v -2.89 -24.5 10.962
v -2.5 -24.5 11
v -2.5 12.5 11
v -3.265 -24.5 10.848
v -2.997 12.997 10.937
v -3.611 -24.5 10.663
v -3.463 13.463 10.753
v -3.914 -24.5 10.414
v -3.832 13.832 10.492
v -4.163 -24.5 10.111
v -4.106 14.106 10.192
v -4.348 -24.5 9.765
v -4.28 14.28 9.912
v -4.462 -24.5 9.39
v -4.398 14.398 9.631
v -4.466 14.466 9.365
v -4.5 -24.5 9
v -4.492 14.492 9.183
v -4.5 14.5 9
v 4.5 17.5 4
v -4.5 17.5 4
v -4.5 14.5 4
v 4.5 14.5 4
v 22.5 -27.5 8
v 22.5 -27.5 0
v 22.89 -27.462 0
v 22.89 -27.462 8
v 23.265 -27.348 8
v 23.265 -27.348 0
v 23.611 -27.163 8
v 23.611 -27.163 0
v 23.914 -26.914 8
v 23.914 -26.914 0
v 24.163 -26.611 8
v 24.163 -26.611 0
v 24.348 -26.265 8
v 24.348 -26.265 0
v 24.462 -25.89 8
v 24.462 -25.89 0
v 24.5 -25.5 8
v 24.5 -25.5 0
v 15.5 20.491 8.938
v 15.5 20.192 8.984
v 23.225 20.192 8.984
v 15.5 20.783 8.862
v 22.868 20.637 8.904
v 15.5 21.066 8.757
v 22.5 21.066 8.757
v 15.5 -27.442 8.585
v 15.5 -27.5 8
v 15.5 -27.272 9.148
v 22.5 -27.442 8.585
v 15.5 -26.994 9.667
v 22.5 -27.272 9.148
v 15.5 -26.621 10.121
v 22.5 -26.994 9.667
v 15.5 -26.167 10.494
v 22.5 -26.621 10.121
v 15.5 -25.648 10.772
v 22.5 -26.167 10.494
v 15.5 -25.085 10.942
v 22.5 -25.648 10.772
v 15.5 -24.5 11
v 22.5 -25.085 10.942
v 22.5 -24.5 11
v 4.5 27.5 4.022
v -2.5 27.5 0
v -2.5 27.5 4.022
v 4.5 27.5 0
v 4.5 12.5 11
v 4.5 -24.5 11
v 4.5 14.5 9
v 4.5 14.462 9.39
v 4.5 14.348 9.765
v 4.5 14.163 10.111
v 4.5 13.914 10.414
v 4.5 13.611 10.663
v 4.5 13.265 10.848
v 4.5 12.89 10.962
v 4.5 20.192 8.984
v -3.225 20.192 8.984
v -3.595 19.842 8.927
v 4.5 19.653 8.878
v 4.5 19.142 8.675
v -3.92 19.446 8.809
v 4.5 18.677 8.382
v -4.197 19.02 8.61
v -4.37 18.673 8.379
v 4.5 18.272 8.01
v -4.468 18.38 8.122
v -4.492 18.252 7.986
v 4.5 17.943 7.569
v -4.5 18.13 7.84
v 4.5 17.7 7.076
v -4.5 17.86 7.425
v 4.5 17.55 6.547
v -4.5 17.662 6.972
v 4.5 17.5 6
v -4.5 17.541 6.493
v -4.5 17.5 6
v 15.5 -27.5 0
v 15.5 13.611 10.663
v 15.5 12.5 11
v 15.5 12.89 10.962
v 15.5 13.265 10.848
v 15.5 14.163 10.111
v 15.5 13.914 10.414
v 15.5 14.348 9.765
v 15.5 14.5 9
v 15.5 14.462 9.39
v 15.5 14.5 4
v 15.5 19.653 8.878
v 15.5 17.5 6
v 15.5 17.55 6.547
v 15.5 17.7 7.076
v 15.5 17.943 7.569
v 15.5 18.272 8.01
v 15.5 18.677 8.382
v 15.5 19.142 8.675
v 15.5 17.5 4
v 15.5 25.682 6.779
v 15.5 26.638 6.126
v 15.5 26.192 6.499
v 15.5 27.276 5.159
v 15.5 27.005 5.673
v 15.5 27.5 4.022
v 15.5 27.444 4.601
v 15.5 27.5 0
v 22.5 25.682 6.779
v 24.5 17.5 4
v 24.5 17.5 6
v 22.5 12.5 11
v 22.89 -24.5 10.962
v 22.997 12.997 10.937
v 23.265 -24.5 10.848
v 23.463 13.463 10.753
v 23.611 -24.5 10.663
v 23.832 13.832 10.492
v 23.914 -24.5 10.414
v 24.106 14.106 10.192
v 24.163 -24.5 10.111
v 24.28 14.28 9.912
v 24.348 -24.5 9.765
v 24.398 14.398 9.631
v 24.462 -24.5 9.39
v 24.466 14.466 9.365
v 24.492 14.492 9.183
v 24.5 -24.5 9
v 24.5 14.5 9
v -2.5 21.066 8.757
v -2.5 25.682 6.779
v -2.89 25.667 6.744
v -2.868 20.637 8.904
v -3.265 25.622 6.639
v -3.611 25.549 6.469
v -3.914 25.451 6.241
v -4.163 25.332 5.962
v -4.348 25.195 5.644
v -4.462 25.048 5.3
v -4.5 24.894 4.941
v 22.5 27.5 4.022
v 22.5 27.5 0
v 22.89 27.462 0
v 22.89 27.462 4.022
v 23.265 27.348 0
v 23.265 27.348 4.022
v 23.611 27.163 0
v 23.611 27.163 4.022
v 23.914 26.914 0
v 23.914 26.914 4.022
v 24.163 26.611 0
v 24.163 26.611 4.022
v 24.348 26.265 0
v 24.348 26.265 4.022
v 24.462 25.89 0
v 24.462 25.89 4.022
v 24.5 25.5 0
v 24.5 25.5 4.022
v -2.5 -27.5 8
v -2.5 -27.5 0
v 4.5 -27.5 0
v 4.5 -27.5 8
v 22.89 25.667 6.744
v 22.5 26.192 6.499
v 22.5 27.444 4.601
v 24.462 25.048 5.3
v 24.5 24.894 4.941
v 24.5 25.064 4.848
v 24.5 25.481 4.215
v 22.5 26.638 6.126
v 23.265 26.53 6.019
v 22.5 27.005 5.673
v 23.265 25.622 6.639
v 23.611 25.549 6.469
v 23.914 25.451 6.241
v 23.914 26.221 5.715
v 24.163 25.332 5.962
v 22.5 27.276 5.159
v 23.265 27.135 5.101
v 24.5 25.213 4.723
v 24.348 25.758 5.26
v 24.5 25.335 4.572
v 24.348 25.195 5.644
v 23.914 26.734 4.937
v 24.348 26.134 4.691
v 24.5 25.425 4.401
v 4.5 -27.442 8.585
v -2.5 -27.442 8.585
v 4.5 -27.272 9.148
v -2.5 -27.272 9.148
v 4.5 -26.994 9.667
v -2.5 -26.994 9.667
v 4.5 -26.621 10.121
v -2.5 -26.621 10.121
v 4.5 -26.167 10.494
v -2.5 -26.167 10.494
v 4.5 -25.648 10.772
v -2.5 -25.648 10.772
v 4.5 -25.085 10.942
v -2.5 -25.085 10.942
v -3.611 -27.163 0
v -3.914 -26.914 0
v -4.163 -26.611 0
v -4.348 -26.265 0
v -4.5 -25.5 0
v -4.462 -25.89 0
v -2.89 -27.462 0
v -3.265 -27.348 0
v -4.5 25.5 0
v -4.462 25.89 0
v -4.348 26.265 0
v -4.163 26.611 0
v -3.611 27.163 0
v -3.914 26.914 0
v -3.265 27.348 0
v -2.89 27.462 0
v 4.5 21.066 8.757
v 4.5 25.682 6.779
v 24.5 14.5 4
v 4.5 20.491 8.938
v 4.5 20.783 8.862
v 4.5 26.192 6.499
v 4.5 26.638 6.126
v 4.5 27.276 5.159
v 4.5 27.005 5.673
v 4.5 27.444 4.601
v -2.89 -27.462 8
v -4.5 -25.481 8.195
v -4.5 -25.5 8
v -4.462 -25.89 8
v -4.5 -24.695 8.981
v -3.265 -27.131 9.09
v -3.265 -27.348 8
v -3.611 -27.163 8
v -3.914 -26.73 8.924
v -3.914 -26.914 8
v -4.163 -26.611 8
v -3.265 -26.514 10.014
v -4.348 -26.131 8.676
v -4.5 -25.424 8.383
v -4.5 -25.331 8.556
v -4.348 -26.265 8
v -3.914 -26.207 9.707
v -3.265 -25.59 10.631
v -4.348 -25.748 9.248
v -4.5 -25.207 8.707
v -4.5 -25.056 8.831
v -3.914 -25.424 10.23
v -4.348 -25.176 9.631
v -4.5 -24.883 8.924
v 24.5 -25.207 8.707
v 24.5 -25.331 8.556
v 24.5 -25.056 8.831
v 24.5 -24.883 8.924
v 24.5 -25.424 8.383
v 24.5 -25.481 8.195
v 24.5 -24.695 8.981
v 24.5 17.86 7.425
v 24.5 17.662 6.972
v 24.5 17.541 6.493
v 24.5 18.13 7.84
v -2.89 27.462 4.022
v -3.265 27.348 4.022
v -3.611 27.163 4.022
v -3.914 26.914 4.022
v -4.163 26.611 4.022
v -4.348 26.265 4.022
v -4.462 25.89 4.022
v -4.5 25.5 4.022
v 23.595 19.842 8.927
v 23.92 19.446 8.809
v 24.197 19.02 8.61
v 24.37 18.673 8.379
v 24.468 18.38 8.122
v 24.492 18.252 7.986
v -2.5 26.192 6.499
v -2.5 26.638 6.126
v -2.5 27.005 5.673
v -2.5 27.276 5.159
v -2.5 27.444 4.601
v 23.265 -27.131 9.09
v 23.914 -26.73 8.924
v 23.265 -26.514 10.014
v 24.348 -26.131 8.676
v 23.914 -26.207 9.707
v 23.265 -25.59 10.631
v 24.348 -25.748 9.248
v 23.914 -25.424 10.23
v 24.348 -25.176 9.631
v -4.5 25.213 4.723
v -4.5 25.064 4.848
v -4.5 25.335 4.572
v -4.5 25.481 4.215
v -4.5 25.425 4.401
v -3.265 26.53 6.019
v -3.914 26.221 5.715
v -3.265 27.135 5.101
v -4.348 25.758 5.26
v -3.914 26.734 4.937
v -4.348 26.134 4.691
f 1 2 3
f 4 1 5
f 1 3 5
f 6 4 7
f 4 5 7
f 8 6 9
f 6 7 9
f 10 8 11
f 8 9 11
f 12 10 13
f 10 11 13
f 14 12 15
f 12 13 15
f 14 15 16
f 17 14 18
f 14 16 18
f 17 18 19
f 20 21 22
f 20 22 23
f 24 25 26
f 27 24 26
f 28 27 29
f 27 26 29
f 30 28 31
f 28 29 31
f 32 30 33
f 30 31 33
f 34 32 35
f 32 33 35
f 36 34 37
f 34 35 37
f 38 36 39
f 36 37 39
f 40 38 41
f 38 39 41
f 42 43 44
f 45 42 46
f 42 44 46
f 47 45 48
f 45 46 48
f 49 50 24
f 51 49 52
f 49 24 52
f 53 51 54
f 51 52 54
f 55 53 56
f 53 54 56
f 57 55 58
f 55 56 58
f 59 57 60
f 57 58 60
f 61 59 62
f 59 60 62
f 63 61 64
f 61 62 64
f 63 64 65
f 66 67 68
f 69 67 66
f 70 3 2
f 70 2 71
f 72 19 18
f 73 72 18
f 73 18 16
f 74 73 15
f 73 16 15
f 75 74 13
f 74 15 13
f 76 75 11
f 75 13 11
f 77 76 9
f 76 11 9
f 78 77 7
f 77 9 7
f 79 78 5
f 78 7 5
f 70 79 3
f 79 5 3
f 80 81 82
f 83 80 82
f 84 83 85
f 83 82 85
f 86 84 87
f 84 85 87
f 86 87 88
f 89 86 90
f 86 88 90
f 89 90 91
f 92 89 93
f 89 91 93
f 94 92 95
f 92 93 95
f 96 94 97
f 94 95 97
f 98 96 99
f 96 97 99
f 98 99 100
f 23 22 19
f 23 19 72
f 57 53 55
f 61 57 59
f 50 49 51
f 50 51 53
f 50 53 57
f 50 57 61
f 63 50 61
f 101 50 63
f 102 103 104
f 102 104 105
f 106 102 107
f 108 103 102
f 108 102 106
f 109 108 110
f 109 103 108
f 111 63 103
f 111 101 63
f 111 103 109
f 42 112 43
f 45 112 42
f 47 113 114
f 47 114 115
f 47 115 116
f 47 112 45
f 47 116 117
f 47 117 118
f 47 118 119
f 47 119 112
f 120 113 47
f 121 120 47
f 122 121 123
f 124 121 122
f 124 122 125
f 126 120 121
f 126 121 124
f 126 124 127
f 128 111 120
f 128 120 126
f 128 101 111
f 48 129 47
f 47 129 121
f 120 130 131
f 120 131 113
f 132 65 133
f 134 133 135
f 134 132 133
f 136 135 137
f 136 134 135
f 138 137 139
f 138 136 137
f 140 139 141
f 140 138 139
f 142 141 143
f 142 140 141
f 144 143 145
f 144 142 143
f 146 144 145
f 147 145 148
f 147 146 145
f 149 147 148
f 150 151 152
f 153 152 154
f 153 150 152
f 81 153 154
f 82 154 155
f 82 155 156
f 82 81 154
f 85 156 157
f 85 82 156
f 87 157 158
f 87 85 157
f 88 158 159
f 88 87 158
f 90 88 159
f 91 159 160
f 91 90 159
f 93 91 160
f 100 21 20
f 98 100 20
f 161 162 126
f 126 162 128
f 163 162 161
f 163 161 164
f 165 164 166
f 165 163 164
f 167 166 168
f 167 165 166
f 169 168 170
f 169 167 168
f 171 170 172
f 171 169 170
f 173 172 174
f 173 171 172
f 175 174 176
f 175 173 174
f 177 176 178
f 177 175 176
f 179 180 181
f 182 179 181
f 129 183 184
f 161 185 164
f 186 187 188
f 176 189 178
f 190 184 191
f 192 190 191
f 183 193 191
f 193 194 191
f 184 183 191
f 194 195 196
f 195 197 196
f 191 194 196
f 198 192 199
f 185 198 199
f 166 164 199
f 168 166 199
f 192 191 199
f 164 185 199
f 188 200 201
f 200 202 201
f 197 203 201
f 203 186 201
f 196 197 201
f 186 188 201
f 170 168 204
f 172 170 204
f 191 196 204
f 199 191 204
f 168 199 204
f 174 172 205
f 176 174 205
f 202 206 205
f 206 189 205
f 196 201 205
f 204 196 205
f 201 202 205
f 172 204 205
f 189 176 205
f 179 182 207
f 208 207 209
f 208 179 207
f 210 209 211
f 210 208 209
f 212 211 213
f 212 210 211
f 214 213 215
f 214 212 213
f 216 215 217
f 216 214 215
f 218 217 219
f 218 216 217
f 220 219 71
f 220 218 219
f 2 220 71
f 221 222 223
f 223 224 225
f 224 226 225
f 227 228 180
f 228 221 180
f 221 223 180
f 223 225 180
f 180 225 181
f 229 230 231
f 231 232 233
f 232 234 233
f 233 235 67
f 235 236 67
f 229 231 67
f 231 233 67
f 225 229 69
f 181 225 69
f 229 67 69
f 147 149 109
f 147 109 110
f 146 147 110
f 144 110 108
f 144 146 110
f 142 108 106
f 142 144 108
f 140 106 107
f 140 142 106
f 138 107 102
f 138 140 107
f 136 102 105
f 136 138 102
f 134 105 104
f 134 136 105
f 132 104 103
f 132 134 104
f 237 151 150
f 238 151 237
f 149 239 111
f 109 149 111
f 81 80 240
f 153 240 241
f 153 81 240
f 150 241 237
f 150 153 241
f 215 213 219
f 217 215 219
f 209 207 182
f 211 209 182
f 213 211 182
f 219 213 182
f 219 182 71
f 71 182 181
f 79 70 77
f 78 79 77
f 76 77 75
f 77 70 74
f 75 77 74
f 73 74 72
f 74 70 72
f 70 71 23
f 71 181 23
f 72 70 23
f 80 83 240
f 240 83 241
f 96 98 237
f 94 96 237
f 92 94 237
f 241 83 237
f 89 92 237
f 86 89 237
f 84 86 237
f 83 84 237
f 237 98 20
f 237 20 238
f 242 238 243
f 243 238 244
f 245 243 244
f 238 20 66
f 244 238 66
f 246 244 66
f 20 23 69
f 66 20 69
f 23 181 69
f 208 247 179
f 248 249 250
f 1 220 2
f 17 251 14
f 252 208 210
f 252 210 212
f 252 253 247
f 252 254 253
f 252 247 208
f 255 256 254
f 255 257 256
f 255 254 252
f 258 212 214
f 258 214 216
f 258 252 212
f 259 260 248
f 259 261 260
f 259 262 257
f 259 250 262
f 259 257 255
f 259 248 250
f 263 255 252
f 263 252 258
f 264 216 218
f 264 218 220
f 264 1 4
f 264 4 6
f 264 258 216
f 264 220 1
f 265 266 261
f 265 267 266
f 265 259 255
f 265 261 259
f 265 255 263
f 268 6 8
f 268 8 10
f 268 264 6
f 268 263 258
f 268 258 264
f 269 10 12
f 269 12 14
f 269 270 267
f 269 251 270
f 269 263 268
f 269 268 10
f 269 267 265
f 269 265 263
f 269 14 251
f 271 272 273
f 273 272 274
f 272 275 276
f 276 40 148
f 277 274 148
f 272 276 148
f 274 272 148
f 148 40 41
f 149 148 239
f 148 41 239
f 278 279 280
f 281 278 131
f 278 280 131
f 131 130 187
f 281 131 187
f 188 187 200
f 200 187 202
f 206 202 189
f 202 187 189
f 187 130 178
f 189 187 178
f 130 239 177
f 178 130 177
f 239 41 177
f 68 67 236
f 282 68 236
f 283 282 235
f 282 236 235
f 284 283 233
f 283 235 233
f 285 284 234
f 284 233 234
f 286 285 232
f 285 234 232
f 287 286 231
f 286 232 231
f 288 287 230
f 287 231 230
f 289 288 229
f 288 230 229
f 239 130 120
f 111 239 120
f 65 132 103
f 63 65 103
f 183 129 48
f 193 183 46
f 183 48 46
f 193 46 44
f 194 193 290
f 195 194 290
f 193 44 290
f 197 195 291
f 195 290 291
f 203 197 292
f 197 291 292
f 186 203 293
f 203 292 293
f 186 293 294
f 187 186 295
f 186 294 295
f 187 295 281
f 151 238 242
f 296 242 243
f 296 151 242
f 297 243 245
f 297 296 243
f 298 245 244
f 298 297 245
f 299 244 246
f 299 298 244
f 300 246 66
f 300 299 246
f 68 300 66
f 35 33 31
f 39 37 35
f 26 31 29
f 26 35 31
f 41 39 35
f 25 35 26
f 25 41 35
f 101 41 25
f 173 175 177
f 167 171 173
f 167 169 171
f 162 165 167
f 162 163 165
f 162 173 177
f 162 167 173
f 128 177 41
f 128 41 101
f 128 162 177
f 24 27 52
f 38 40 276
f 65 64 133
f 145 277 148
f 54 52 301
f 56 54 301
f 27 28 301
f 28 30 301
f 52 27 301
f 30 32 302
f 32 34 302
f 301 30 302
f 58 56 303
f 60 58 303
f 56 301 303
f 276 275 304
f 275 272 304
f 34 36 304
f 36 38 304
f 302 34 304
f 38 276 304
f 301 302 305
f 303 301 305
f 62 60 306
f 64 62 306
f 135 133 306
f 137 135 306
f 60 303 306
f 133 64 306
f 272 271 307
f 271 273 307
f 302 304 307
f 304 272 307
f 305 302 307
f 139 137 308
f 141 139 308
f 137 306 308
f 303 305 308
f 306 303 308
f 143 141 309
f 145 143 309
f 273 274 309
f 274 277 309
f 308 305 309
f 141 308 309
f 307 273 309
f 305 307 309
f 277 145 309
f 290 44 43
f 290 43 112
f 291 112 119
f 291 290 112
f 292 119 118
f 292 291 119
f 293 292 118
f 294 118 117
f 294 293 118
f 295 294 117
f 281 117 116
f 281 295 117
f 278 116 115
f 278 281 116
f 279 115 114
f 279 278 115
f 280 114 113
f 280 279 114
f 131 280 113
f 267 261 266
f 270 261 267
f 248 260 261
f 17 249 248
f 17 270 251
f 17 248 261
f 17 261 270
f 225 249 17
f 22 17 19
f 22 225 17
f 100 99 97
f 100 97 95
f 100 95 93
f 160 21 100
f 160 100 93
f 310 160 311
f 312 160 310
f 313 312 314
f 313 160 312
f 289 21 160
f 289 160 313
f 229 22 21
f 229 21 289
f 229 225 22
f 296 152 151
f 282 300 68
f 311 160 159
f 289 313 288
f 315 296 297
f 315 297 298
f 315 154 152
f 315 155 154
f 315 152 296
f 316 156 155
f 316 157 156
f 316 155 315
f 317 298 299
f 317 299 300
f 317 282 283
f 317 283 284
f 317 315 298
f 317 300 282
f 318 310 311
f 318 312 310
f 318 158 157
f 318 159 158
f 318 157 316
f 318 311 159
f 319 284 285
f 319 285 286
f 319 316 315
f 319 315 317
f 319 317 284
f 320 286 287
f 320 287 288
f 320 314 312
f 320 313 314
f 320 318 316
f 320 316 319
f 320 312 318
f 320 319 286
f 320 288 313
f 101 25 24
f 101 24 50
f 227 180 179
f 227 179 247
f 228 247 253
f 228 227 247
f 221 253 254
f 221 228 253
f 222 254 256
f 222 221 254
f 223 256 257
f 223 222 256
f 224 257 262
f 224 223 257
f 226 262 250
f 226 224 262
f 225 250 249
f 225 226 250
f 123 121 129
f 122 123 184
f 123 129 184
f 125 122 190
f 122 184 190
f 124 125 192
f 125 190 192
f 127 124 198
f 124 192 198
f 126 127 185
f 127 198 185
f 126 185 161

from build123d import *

# Parameters (mm, degrees)
F0_W         = 9
F0_H         = 3
F1_DEPTH     = 4
F0_H_2       = 10
F2_DEPTH     = 9
F0_H_3       = 42
F3_DEPTH     = 11
F4_SIZE2     = 3
F4_SIZE      = 7
F5_T1_DEPTH  = 24
F5_T3_DEPTH  = 18.8909423697
F5_T5_DEPTH  = 12.0788655293
F6_T1_DEPTH  = 19
F6_T3_DEPTH  = 44
F6_T5_DEPTH  = 10.021811526
F6_T7_DEPTH  = 13
F6_T9_DEPTH  = 9.0218115261
F6_T12_ANGLE = 90.0000000053
F6_T14_ANGLE = 66.8014094864


# Not quite as in the source:
# - a fillet or chamfer that OpenCascade refuses, or shapes differently, is made with other operations: its cross-section is extruded or revolved along the edge and cut away or added


with BuildPart() as f1:
    # F0 (on Top) → F1 (new body)
    with BuildSketch(Plane.XY):
        with Locations((0, 16)):
            Rectangle(F0_W, F0_H)
    extrude(amount=F1_DEPTH)

    # F0 (on Top) → F2 (join)
    with BuildSketch(Plane.XY):
        with Locations((0, 22.5)):
            Rectangle(F0_W, F0_H_2)
    extrude(amount=F2_DEPTH)

    # F0 (on Top) → F3 (join)
    with BuildSketch(Plane.XY):
        with Locations((0, -6.5)):
            Rectangle(F0_W, F0_H_3)
    extrude(amount=F3_DEPTH)

    # F4
    f4_edges = [f1.edges().sort_by_distance(p)[0] for p in [
        (0, 27.5, 9),
    ]]
    f4_side = f1.faces().sort_by_distance((0, 22.5, 9))[0]
    chamfer(f4_edges, length=F4_SIZE, length2=F4_SIZE2, reference=f4_side)

    # F5: fillet of radius 3 on 4 edges, made by hand

    # F5_s2 → F5_t1 (cut)
    with BuildSketch(Plane.YZ.offset(-12)):
        with BuildLine():
            ThreePointArc((20.5, 9), (18.3786796564, 8.1213203436), (17.5, 6))
            Line((17.5, 6), (17.5, 9))
            Line((17.5, 9), (20.5, 9))
        make_face()
        with BuildLine():
            ThreePointArc((-27.5, 8), (-26.6213203436, 10.1213203436), (-24.5, 11))
            Line((-24.5, 11), (-27.5, 11))
            Line((-27.5, 11), (-27.5, 8))
        make_face()
    extrude(amount=F5_T1_DEPTH, mode=Mode.SUBTRACT)

    # F5_s4 → F5_t3 (cut)
    with BuildSketch(Plane.YZ.offset(-9.4454711849)):
        with BuildLine():
            ThreePointArc((25.6817578957, 6.7792466161), (27.0045232767, 5.6732845523), (27.5, 4.0218115261))
            Line((27.5, 4.0218115261), (27.5, 6))
            Line((27.5, 6), (25.6817578957, 6.7792466161))
        make_face()
    extrude(amount=F5_T3_DEPTH, mode=Mode.SUBTRACT)

    # F5_s6 → F5_t5 (cut)
    with BuildSketch(Plane.YZ.offset(-6.0394327647)):
        with BuildLine():
            ThreePointArc((19.8842268941, 9), (20.4874245109, 8.9387331684), (21.0659847899, 8.7574350901))
            Line((21.0659847899, 8.7574350901), (20.5, 9))
            Line((20.5, 9), (19.8842268941, 9))
        make_face()
    extrude(amount=F5_T5_DEPTH, mode=Mode.SUBTRACT)

    # F6: fillet of radius 2 on 7 edges, made by hand

    # F6_s2 → F6_t1 (cut)
    with BuildSketch(Plane.YZ.offset(-9.5)):
        with BuildLine():
            ThreePointArc((14.5, 9), (13.9142135624, 10.4142135624), (12.5, 11))
            Line((12.5, 11), (14.5, 11))
            Line((14.5, 11), (14.5, 9))
        make_face()
    extrude(amount=F6_T1_DEPTH, mode=Mode.SUBTRACT)

    # F6_s4 → F6_t3 (cut)
    with BuildSketch(Plane.XZ.offset(-19.5)):
        with BuildLine():
            ThreePointArc((-2.5, 11), (-3.9142135624, 10.4142135624), (-4.5, 9))
            Line((-4.5, 9), (-4.5, 11))
            Line((-4.5, 11), (-2.5, 11))
        make_face()
    extrude(amount=F6_T3_DEPTH, mode=Mode.SUBTRACT)

    # F6_s6 → F6_t5 (cut)
    with BuildSketch(Plane(origin=(0, 10.0306044674, -4.298830486), x_dir=(1, 0, 0), z_dir=(0, 0.91914503, -0.3939192986))):
        with BuildLine():
            ThreePointArc((-2.5, -16.347650891), (-3.9142135624, -15.7618644534), (-4.5, -14.347650891))
            Line((-4.5, -14.347650891), (-4.5, -16.347650891))
            Line((-4.5, -16.347650891), (-2.5, -16.347650891))
        make_face()
    extrude(amount=F6_T5_DEPTH, mode=Mode.SUBTRACT)

    # F6_s8 → F6_t7 (cut)
    with BuildSketch(Plane.XY.offset(-5)):
        with BuildLine():
            ThreePointArc((-2.5, -27.5), (-3.9142135624, -26.9142135624), (-4.5, -25.5))
            Line((-4.5, -25.5), (-4.5, -27.5))
            Line((-4.5, -27.5), (-2.5, -27.5))
        make_face()
    extrude(amount=F6_T7_DEPTH, mode=Mode.SUBTRACT)

    # F6_s10 → F6_t9 (cut)
    with BuildSketch(Plane.XY.offset(-5)):
        with BuildLine():
            ThreePointArc((-2.5, 27.5), (-3.9142135624, 26.9142135624), (-4.5, 25.5))
            Line((-4.5, 25.5), (-4.5, 27.5))
            Line((-4.5, 27.5), (-2.5, 27.5))
        make_face()
    extrude(amount=F6_T9_DEPTH, mode=Mode.SUBTRACT)

    # F6_s11 → F6_t12 (revolve, cut)
    with BuildSketch(Plane.XY.offset(8.0000000001)):
        with BuildLine():
            ThreePointArc((-2.5, -27.5), (-3.9142135624, -26.9142135624), (-4.5, -25.5))
            Line((-4.5, -25.5), (-4.5, -27.5))
            Line((-4.5, -27.5), (-2.5, -27.5))
        make_face()
    revolve(axis=Axis((-4.5, -24.5000000001, 8.0000000001), (-1, 0, 0)), revolution_arc=F6_T12_ANGLE, mode=Mode.SUBTRACT)

    # F6_s13 → F6_t14 (revolve, cut)
    with BuildSketch(Plane(origin=(0, 19.2421027237, -8.2466154526), x_dir=(1, 0, 0), z_dir=(0, -0.91914503, 0.3939192986))):
        with BuildLine():
            ThreePointArc((-2.5, 16.3476508906), (-3.9142135624, 15.761864453), (-4.5, 14.3476508906))
            Line((-4.5, 14.3476508906), (-4.5, 16.3476508906))
            Line((-4.5, 16.3476508906), (-2.5, 16.3476508906))
        make_face()
    revolve(axis=Axis((-4.5, 24.5, 4.021811526), (-1, 0, 0)), revolution_arc=F6_T14_ANGLE, mode=Mode.SUBTRACT)


with BuildPart() as f8_1:
    # F8: instance of F1
    add(f1.part.mirror(Plane.YZ.offset(10)))


solid = Compound([f1.part, f8_1.part])
